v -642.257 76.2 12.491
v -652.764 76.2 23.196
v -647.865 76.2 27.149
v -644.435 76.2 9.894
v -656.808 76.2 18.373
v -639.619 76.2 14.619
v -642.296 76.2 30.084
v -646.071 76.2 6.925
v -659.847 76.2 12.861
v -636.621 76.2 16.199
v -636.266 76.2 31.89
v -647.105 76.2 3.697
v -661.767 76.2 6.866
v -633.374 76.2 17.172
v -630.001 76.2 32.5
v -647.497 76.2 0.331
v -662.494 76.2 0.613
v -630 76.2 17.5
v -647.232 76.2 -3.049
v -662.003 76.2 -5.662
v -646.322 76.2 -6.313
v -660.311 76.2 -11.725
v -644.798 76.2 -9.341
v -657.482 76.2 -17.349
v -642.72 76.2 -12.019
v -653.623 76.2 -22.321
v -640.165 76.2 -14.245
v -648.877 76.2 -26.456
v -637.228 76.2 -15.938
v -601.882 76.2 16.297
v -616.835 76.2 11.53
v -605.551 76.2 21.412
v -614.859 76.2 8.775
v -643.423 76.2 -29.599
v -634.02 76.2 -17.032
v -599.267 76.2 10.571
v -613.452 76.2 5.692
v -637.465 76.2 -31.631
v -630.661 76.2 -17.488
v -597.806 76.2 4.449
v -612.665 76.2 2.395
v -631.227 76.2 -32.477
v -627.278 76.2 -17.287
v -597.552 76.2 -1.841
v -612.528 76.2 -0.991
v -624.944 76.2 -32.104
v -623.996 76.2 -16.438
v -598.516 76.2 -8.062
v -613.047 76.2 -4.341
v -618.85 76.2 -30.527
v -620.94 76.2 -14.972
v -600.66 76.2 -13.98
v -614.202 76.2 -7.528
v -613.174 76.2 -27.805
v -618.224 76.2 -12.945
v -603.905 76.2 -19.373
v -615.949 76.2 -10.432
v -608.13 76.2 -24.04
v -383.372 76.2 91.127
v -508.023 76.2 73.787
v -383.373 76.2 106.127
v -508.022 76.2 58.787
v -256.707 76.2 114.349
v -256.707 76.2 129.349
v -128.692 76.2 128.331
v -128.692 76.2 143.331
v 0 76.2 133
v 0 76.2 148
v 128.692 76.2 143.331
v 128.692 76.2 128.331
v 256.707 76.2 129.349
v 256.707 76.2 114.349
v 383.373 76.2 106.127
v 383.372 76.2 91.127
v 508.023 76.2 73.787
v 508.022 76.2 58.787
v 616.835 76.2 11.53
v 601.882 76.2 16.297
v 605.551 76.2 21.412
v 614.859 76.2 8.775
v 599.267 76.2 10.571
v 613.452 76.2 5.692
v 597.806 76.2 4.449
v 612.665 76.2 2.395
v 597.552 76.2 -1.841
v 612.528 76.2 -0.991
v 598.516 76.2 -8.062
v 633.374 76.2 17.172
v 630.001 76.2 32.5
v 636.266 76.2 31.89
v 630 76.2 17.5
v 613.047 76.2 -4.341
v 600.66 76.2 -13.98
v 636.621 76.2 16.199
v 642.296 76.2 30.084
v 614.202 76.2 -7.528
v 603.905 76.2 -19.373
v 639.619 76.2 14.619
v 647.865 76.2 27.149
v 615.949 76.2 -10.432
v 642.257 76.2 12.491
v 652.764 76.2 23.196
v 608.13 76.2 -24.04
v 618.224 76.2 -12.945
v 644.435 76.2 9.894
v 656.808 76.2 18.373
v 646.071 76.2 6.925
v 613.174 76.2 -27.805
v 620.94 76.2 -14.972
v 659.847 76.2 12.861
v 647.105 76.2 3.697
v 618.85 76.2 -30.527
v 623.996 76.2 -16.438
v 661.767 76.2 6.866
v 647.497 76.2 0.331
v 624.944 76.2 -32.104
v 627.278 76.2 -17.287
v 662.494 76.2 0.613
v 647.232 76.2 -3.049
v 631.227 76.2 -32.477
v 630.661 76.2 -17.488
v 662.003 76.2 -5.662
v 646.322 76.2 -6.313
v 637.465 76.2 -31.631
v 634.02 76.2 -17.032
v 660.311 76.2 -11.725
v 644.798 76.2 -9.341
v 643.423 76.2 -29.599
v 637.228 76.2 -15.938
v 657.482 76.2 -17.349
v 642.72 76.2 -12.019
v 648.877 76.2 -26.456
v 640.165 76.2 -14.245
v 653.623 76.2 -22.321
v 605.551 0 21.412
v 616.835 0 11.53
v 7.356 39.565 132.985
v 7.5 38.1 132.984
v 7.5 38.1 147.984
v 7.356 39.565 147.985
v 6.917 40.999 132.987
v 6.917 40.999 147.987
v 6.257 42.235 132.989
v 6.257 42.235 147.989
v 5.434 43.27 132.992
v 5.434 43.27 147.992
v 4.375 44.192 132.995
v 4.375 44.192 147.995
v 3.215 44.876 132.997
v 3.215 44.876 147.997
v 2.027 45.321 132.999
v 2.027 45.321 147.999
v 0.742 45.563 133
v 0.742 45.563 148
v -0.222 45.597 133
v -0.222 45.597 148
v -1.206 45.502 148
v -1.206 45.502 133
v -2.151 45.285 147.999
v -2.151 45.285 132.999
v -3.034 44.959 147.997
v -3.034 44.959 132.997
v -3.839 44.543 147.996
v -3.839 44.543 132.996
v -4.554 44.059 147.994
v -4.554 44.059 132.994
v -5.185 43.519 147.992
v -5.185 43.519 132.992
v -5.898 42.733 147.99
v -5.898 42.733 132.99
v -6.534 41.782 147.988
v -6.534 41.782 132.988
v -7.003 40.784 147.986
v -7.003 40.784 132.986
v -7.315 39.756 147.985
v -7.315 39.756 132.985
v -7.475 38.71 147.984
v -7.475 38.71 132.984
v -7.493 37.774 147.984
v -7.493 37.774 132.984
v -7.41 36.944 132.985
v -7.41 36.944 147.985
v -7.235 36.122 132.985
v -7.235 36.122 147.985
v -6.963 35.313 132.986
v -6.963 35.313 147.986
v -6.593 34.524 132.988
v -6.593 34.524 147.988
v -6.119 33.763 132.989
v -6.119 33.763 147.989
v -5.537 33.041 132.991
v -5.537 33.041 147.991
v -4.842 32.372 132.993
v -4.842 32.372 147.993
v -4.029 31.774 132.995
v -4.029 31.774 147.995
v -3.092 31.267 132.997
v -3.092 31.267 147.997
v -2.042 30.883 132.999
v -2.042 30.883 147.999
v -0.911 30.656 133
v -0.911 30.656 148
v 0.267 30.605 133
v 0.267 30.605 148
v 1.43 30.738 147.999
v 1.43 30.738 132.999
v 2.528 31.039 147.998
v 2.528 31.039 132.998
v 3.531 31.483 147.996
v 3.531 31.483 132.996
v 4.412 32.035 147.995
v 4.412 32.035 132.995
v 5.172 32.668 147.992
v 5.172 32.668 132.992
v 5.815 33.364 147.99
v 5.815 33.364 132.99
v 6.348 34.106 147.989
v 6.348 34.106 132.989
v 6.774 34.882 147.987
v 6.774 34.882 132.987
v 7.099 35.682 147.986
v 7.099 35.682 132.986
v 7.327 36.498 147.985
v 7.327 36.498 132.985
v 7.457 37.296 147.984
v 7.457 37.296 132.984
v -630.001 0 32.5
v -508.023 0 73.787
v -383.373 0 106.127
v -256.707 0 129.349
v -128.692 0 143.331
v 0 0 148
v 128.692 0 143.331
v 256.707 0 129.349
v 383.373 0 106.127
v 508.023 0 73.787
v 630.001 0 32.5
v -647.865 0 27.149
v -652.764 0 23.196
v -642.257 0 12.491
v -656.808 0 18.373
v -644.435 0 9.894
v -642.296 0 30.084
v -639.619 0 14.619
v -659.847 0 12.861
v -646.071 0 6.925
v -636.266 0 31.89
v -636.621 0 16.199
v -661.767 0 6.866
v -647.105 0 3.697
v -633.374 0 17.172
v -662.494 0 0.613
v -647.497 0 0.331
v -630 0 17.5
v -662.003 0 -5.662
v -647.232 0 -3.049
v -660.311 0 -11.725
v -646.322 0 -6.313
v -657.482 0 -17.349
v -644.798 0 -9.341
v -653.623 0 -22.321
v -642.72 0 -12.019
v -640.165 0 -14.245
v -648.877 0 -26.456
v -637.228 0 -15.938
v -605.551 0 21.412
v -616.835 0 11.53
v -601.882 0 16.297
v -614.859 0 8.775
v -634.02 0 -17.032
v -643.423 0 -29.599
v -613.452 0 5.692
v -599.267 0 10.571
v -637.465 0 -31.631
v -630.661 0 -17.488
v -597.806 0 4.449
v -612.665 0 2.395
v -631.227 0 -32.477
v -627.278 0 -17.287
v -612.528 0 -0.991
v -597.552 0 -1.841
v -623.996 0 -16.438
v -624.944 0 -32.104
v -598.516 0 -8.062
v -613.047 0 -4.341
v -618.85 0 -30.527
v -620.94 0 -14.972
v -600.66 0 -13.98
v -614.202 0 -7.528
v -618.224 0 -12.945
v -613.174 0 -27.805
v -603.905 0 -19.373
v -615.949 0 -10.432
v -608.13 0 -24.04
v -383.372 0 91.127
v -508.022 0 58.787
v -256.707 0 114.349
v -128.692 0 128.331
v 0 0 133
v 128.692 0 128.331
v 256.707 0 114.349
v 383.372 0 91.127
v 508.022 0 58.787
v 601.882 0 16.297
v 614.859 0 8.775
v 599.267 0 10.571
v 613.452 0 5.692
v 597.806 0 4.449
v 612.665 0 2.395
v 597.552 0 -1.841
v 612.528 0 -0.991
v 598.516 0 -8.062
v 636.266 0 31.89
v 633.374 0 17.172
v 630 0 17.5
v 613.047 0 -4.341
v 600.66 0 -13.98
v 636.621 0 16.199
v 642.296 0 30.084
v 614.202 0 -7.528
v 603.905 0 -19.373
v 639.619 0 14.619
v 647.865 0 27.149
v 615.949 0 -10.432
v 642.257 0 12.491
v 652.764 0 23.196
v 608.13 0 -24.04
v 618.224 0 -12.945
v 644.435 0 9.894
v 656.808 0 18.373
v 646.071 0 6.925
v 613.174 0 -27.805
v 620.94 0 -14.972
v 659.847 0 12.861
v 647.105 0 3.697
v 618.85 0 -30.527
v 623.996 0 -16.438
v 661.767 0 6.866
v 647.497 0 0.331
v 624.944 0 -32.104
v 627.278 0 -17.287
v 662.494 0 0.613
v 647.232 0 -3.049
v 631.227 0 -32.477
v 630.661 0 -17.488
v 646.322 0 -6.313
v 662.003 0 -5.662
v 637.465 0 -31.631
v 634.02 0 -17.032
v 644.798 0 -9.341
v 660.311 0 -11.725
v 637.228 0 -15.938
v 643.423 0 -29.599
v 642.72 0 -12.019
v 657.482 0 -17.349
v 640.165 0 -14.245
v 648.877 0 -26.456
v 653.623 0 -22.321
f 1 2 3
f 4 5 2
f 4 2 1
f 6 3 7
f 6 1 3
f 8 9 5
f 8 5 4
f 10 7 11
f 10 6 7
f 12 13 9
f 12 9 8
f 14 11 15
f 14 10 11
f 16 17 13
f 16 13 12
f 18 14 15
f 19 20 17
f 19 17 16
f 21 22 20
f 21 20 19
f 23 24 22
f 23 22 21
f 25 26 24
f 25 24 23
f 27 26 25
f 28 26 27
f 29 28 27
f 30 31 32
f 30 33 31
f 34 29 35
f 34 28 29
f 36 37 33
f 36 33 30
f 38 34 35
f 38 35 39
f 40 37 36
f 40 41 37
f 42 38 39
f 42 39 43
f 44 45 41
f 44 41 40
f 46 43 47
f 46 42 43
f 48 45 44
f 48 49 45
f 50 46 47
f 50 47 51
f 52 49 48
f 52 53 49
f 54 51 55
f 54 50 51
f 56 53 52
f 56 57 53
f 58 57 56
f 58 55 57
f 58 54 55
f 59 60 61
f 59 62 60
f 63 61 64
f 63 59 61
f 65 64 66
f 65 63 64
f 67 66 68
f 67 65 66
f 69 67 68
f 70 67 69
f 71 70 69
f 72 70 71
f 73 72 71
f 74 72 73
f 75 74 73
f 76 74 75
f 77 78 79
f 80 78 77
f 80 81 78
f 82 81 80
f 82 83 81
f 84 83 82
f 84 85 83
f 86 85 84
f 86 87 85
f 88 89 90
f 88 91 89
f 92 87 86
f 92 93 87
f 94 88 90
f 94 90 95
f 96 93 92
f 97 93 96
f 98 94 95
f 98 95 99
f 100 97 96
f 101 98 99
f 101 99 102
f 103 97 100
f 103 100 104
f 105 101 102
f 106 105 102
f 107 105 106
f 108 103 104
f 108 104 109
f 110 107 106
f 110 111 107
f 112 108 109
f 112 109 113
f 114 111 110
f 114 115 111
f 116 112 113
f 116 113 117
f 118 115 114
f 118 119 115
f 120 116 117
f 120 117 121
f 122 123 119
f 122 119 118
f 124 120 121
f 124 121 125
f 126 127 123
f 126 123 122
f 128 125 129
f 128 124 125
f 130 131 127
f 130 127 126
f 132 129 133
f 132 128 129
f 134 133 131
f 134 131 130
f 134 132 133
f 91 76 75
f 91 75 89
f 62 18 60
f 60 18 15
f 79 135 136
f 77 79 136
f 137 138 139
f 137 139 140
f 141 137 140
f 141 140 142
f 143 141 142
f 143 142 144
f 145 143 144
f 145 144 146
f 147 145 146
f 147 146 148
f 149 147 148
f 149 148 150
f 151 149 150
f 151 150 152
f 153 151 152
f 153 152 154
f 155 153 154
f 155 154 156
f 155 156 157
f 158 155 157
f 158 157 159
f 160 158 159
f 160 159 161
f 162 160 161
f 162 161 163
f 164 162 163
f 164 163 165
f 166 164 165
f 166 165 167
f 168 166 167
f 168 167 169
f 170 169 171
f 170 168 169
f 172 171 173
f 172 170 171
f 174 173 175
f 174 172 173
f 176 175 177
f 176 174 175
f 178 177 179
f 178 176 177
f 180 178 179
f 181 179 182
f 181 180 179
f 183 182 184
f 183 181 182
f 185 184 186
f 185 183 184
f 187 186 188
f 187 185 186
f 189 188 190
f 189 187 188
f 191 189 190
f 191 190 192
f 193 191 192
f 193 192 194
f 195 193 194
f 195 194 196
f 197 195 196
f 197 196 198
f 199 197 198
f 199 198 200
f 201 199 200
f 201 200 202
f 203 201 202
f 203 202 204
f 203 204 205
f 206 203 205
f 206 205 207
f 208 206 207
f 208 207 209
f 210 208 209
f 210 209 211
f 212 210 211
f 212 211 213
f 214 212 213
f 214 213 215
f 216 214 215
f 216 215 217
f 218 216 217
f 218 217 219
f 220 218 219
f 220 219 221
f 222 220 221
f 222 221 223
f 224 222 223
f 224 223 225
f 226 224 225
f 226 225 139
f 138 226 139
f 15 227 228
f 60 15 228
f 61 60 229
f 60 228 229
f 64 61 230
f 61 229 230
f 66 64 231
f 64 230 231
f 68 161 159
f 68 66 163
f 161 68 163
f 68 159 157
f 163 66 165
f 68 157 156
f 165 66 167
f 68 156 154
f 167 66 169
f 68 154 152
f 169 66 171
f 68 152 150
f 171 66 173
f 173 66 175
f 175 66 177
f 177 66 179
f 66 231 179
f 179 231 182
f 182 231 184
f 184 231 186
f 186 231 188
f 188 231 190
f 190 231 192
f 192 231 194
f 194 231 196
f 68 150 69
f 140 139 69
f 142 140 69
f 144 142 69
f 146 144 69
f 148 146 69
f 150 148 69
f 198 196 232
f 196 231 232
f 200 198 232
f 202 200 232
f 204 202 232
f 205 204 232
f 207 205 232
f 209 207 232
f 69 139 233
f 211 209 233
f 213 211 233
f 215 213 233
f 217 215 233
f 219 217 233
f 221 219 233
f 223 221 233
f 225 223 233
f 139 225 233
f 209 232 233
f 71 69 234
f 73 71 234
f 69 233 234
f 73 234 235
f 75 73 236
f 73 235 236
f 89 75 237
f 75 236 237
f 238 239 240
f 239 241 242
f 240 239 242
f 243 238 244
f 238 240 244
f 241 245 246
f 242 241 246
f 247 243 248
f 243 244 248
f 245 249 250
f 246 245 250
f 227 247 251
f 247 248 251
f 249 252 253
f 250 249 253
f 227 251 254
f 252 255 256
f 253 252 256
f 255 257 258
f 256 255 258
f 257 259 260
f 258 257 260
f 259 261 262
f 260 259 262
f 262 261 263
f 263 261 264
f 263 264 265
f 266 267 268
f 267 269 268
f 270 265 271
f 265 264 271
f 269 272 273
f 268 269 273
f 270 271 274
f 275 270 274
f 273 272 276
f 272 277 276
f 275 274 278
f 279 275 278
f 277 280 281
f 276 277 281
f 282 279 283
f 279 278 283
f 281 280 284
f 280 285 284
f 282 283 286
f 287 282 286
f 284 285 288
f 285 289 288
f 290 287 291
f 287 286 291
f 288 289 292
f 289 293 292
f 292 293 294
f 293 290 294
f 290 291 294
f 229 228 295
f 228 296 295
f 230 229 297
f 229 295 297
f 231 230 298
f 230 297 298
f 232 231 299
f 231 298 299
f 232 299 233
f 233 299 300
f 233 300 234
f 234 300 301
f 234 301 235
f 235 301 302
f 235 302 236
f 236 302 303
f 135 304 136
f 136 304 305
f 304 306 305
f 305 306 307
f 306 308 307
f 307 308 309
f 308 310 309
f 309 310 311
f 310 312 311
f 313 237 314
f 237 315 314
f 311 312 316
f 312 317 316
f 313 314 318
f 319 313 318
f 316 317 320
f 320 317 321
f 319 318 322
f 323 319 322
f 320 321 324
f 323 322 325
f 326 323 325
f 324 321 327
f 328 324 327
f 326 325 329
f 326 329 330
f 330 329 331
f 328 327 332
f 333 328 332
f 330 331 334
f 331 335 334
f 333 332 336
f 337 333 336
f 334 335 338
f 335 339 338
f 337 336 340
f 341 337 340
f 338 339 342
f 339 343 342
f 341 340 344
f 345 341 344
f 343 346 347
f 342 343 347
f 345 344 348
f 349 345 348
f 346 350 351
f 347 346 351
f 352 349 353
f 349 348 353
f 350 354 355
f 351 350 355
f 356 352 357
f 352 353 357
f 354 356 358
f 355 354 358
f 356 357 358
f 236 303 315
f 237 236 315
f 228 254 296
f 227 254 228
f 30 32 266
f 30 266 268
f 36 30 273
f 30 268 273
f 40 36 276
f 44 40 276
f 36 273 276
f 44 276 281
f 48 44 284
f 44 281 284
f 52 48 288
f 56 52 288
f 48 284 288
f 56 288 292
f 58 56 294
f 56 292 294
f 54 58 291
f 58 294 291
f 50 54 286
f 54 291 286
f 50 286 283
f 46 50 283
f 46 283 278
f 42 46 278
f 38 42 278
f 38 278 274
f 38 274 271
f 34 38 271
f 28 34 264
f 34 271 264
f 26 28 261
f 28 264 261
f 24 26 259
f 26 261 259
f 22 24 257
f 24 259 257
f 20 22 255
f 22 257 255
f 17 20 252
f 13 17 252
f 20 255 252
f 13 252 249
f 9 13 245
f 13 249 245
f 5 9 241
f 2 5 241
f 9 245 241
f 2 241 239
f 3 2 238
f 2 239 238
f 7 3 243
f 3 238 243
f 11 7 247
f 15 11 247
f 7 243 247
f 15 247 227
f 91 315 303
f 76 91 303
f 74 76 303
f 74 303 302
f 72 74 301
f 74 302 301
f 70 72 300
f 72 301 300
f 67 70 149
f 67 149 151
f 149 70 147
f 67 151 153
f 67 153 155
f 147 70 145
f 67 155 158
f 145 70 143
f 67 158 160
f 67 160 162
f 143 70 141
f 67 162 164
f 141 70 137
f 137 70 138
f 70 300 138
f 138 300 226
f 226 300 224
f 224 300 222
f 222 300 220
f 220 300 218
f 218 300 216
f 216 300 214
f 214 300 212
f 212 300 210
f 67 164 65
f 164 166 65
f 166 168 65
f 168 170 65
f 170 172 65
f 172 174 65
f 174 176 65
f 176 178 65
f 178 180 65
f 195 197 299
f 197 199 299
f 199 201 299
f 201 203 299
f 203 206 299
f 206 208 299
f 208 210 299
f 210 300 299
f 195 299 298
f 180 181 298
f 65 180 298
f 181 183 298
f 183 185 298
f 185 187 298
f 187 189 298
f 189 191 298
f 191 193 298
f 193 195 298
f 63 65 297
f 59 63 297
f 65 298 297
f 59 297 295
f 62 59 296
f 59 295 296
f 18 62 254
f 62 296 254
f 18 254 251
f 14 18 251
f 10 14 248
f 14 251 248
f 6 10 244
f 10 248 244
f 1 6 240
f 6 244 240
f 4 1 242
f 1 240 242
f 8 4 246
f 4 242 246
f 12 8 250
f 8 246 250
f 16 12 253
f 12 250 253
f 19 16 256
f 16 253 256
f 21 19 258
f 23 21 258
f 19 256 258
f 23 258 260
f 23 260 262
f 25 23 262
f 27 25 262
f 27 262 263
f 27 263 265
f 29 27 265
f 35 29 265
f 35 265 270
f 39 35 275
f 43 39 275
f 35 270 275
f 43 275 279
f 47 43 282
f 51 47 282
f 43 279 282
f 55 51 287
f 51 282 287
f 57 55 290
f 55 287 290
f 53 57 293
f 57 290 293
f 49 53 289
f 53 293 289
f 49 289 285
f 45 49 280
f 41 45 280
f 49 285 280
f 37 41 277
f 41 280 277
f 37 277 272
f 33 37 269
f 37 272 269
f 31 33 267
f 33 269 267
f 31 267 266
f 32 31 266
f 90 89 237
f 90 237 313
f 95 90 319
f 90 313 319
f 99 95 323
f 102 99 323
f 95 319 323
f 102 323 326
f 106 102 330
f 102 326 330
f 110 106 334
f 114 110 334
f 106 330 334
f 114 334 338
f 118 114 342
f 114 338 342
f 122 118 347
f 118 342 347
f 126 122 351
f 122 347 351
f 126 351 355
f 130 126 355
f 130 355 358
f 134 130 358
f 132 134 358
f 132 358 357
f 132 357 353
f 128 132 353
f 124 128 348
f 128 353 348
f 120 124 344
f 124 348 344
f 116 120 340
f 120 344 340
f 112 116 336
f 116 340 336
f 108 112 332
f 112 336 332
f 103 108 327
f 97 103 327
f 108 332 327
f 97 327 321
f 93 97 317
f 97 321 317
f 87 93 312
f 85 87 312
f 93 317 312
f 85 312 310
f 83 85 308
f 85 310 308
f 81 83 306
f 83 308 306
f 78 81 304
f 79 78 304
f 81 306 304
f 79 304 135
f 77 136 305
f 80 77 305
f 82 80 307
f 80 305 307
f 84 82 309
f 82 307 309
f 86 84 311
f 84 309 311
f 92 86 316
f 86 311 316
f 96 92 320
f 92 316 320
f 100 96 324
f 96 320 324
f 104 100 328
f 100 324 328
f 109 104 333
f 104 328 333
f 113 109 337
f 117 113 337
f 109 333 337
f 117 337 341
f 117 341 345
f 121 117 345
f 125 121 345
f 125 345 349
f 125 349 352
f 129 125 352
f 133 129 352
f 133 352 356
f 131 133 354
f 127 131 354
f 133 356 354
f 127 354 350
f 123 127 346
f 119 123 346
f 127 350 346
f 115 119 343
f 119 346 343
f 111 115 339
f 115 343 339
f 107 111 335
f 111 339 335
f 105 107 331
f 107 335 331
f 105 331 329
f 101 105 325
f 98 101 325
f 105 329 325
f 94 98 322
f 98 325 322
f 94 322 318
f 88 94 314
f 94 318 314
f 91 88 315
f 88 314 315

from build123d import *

# Parameters (mm, degrees)
BOSS_EXTRUDE3_DEPTH = 76.2
SKETCH5_R           = 7.5
CUT_EXTRUDE3_DEPTH  = 149


with BuildPart() as part:
    # Sketch1 → Boss-Extrude3 (new body)
    with BuildSketch(Plane(origin=(0, 0, 0), x_dir=(1, 0, 0), z_dir=(0, 1, 0))):
        with BuildLine():
            Line((-616.834962438, -11.529604763), (-605.550644545, -21.412123117))
            ThreePointArc((-605.550644545, -21.412123117), (-643.422534006, 29.598742869), (-630.001110861, -32.499999959))
            ThreePointArc((-630.001110861, -32.499999959), (0, -148), (630.001110861, -32.499999959))
            ThreePointArc((630.001110861, -32.499999959), (643.422534006, 29.598742869), (605.550644545, -21.412123117))
            Line((605.550644545, -21.412123117), (616.834962438, -11.529604763))
            ThreePointArc((616.834962438, -11.529604763), (637.227790694, 15.937661111), (630, -17.5))
            ThreePointArc((630, -17.5), (0, -133), (-630, -17.5))
            ThreePointArc((-630, -17.5), (-637.227790694, 15.937661111), (-616.834962438, -11.529604763))
        make_face()
    extrude(amount=BOSS_EXTRUDE3_DEPTH)

    # Sketch5 → Cut-Extrude3 (cut, through all)
    with BuildSketch(Plane.XY):
        with Locations((0, 38.1)):
            Circle(SKETCH5_R)
    extrude(amount=CUT_EXTRUDE3_DEPTH, mode=Mode.SUBTRACT)


solid = part.part
